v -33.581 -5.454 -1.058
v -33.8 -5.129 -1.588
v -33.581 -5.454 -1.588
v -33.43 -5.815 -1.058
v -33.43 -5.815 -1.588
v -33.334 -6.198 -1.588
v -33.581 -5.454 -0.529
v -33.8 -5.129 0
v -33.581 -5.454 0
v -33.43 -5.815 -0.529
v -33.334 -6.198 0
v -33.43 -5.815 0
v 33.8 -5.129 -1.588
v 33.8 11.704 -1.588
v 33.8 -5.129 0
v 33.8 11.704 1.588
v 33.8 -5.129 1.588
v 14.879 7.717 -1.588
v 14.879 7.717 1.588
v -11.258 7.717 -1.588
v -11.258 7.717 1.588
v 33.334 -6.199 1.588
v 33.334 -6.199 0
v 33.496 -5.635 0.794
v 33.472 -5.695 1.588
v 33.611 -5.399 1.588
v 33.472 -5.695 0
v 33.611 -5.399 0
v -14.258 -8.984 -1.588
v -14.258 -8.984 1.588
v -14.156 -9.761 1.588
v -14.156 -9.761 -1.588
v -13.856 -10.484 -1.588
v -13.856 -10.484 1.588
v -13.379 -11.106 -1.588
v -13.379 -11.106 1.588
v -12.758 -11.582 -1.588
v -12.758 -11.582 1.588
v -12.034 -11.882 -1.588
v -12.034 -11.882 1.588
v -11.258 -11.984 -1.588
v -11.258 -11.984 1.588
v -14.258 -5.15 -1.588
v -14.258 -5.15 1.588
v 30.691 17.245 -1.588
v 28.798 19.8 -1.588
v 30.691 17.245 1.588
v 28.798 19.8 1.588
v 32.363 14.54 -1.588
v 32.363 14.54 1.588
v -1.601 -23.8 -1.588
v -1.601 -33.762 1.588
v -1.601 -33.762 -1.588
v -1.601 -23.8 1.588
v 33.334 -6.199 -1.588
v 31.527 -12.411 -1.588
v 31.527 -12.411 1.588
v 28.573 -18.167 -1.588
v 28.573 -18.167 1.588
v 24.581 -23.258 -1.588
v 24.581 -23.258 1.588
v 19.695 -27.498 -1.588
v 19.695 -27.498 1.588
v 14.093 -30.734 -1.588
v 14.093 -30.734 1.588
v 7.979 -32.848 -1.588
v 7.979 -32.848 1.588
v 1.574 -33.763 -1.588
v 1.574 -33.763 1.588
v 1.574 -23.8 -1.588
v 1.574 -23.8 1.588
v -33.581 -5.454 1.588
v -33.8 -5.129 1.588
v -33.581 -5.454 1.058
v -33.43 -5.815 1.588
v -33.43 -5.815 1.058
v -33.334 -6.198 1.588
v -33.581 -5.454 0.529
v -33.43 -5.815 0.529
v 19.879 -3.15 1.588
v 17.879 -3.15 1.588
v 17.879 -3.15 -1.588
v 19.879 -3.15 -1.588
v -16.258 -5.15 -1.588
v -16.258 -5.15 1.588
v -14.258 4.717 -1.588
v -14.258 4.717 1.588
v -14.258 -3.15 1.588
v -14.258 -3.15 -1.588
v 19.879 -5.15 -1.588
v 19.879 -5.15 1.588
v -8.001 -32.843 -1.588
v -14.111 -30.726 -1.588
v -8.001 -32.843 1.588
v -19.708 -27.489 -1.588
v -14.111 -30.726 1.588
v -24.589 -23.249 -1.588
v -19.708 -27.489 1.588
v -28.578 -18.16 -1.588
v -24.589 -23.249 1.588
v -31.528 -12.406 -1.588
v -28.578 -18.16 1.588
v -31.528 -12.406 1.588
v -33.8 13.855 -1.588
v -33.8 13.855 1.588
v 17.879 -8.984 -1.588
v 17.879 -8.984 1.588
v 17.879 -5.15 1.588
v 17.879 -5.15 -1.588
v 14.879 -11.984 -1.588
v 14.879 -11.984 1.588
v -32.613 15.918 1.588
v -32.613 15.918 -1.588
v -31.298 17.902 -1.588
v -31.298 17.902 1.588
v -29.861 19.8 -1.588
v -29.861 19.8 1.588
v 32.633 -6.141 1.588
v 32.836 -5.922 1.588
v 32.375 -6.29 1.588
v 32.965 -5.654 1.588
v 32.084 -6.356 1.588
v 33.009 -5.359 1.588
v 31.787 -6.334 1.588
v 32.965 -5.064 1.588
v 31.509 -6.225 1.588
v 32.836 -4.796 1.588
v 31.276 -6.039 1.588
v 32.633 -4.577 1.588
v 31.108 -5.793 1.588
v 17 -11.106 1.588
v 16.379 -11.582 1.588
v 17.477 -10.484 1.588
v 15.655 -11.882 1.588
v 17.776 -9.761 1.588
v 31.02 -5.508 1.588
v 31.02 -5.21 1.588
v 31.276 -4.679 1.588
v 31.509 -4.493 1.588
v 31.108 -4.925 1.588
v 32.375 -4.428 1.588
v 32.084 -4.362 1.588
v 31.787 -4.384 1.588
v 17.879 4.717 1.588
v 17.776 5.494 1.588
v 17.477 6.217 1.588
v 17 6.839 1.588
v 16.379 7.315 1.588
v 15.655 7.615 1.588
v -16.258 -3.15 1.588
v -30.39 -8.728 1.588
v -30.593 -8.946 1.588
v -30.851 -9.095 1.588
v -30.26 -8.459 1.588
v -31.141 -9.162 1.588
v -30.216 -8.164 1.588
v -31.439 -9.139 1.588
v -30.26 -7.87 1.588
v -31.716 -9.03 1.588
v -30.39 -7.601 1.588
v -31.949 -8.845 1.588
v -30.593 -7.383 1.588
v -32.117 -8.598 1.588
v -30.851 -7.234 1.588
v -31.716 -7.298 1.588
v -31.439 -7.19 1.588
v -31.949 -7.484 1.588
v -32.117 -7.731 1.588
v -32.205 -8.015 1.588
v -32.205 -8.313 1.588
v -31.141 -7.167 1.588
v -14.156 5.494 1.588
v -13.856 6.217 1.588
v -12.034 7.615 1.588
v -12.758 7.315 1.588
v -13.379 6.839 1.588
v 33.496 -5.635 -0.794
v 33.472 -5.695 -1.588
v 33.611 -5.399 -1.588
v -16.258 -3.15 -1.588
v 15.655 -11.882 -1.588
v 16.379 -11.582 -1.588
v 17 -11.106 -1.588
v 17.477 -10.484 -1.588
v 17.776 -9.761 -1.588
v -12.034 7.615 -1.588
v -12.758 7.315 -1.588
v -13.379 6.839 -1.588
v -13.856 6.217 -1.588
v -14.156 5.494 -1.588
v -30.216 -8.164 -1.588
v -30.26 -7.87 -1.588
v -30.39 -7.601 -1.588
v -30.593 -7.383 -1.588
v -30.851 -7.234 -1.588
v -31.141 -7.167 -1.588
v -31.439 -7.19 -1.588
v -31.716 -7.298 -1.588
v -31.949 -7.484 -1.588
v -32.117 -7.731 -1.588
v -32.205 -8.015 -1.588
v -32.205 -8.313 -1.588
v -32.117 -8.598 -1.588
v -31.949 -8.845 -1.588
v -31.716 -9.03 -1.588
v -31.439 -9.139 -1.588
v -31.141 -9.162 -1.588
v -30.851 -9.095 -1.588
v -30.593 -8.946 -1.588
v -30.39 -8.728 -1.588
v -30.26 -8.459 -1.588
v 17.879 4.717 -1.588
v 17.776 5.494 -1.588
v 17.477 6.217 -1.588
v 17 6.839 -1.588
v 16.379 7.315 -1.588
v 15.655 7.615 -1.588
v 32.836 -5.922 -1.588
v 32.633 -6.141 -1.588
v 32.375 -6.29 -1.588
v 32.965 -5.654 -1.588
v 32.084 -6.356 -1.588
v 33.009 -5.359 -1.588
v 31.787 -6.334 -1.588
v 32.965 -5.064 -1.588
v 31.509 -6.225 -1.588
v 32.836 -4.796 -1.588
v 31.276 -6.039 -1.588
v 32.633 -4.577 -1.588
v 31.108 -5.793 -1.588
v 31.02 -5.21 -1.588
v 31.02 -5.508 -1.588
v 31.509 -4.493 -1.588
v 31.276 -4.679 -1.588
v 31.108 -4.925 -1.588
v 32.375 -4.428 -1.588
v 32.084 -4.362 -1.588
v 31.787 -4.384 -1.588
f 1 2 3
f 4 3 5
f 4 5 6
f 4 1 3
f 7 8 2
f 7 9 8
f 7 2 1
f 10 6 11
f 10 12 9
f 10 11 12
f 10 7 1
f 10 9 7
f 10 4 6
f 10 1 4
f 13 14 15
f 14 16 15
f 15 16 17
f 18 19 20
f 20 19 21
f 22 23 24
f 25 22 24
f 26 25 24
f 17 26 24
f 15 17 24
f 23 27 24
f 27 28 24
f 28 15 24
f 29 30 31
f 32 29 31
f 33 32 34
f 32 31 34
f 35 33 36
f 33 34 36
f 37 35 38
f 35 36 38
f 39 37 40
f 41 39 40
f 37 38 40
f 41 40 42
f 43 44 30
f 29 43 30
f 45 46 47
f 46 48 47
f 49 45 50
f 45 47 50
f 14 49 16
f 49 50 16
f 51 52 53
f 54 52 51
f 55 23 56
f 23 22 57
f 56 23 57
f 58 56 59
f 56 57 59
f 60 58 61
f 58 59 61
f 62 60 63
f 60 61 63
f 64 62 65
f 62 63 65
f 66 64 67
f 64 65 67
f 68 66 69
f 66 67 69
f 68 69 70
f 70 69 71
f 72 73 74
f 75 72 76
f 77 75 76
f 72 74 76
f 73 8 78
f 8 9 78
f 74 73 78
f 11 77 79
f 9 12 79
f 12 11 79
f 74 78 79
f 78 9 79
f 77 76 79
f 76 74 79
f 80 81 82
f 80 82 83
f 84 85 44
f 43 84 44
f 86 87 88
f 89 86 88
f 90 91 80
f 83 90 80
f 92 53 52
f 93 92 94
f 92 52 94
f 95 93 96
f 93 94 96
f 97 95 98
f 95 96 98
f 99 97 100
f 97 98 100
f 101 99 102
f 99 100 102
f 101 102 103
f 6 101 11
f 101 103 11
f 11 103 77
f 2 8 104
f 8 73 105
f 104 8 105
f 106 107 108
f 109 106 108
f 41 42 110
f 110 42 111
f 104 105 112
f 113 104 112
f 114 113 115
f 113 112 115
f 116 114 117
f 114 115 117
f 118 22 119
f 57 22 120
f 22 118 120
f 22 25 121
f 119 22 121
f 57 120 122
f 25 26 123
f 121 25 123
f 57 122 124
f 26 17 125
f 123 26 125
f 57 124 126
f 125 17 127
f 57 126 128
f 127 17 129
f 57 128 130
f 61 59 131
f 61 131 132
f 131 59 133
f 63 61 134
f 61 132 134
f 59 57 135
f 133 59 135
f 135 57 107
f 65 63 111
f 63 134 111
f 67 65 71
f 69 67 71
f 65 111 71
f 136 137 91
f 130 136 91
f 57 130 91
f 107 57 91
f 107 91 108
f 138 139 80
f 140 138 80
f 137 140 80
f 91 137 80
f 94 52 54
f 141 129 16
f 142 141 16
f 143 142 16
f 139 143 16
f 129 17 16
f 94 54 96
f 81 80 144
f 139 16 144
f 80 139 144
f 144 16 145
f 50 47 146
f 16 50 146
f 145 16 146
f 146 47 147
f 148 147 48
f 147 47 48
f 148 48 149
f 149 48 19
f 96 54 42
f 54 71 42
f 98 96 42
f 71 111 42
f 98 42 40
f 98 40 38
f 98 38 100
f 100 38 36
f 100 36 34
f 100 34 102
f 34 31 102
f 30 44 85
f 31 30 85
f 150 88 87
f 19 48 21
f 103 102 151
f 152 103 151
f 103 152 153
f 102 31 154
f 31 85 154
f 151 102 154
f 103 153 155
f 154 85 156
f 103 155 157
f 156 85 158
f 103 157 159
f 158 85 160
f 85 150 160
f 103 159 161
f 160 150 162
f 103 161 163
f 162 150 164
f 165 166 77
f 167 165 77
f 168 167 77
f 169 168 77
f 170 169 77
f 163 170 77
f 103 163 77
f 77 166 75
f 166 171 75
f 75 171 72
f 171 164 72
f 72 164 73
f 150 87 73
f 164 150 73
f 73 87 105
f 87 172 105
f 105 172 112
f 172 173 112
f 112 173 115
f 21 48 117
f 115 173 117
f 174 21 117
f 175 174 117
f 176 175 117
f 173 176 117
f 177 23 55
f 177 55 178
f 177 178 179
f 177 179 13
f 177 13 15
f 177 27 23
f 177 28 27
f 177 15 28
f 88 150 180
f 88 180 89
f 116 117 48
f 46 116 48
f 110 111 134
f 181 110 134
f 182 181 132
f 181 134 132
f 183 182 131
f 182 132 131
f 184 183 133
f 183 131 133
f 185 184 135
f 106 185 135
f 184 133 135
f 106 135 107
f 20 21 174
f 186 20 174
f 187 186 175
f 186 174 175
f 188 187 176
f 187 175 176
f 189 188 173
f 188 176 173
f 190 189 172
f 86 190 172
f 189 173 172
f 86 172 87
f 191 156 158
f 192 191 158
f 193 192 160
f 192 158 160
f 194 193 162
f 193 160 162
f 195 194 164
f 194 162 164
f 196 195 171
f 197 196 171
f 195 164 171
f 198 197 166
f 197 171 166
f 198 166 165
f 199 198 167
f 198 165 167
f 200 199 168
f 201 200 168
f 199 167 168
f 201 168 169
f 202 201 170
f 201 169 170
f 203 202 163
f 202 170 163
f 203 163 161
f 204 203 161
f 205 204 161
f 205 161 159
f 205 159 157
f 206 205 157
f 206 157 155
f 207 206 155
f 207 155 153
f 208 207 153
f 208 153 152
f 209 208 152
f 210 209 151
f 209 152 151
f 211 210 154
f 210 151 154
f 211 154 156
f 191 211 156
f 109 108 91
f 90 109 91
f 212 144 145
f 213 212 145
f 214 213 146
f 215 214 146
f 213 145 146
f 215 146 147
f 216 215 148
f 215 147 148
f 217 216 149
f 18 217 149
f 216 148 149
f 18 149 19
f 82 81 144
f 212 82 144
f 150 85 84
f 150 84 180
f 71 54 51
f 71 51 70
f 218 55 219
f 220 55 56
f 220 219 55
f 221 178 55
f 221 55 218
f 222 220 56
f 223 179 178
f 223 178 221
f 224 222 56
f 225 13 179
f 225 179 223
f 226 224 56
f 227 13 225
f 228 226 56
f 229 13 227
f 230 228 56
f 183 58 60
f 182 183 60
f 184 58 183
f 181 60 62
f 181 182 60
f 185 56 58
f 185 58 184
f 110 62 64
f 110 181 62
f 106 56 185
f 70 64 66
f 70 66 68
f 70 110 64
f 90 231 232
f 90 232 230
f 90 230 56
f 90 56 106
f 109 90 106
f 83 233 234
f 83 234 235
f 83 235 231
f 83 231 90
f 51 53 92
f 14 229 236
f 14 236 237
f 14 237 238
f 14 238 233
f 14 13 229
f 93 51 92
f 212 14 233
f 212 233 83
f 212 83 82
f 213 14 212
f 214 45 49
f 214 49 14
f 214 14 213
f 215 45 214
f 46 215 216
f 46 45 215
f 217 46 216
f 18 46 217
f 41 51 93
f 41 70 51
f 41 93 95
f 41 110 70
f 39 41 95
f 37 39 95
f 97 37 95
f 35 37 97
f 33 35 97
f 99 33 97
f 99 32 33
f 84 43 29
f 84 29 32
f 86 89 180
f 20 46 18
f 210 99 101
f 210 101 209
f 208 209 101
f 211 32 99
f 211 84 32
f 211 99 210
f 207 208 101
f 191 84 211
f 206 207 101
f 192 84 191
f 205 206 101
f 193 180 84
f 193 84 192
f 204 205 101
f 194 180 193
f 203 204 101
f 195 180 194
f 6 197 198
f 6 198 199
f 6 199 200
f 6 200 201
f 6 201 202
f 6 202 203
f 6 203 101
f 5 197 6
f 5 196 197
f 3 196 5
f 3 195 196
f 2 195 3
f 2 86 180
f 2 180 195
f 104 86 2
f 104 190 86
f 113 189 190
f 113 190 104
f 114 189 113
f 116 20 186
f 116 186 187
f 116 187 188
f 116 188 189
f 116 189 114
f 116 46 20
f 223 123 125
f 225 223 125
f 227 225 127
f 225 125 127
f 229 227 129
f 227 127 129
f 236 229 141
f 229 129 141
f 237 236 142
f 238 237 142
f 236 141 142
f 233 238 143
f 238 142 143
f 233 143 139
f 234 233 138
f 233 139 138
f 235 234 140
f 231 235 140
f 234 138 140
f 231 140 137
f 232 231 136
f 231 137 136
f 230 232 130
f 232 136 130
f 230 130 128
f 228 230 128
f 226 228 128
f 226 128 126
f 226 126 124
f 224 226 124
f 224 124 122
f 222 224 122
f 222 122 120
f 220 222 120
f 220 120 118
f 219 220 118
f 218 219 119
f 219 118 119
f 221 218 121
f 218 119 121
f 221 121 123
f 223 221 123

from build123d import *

# Parameters (mm, degrees)
BOSS_EXTRUDE1_DEPTH = 1.5875
SKETCH2_R           = 1
CUT_EXTRUDE1_DEPTH  = 3.175
SKETCH3_W           = 3.175
SKETCH3_H           = 10.970571453
CUT_EXTRUDE2_DEPTH  = 48.905462264
SKETCH4_W           = 2
SKETCH4_H           = 2
CUT_EXTRUDE3_DEPTH  = 48.879683973


with BuildPart() as part:
    # Sketch1 → Boss-Extrude1 (new, symmetric)
    with BuildSketch(Plane.XY):
        with BuildLine():
            Line((-29.861047016, 19.799597713), (28.798323584, 19.799597713))
            ThreePointArc((28.798323584, 19.799597713), (31.555543196, 15.909935232), (33.800017398, 11.703503281))
            Line((33.800017398, 11.703503281), (33.800017398, -5.129281896))
            add(Edge.make_bspline(
                [(33.333736062, -6.198908202), (33.370273649, -6.00495249), (33.420827163, -5.815771167), (33.570327065, -5.45389308), (33.6709127, -5.28028559), (33.800017398, -5.129281896)],
                knots=[0, 0, 0, 0, 0.5, 0.5, 1, 1, 1, 1], degree=3))
            ThreePointArc((33.333736062, -6.198908202), (-0.00068987, -33.79957838), (-33.333992426, -6.197552493))
            add(Edge.make_bspline(
                [(-33.800017403, -5.129281896), (-33.542046516, -5.431010319), (-33.407261527, -5.809359873), (-33.333992426, -6.197552493)],
                knots=[0, 0, 0, 0, 1, 1, 1, 1], degree=3))
            Line((-33.800017403, -5.129281896), (-33.800017403, 13.855371896))
            ThreePointArc((-33.800017403, 13.855371896), (-31.971328776, 16.92078434), (-29.861047016, 19.799597713))
        make_face()
    extrude(amount=BOSS_EXTRUDE1_DEPTH, both=True)

    # Sketch2 → Cut-Extrude1 (cut)
    with BuildSketch(Plane.XY.offset(1.5875)):
        with Locations((-31.216064399, -8.164436653)):
            Circle(SKETCH2_R)
        with Locations((32.009302375, -5.358989516)):
            Circle(SKETCH2_R)
    extrude(amount=-CUT_EXTRUDE1_DEPTH, mode=Mode.SUBTRACT)

    # Sketch3 → Cut-Extrude2 (cut, through all)
    with BuildSketch(Plane.XY.offset(1.5875)):
        with Locations((-0.013127042, -29.284890239)):
            Rectangle(SKETCH3_W, SKETCH3_H)
    extrude(amount=-CUT_EXTRUDE2_DEPTH, mode=Mode.SUBTRACT)

    # Sketch4 → Cut-Extrude3 (cut, through all)
    with BuildSketch(Plane.XY.offset(1.5875)):
        with BuildLine():
            Line((-14.257724699, 4.717183699), (-14.257724699, -8.984256283))
            ThreePointArc((-14.257724699, -8.984256283), (-13.379045042, -11.105576627), (-11.257724699, -11.984256283))
            Line((-11.257724699, -11.984256283), (14.878600613, -11.984256283))
            ThreePointArc((14.878600613, -11.984256283), (16.999920956, -11.105576627), (17.878600613, -8.984256283))
            Line((17.878600613, -8.984256283), (17.878600613, 4.717183699))
            ThreePointArc((17.878600613, 4.717183699), (16.999920956, 6.838504042), (14.878600613, 7.717183699))
            Line((14.878600613, 7.717183699), (-11.257724699, 7.717183699))
            ThreePointArc((-11.257724699, 7.717183699), (-13.379045042, 6.838504042), (-14.257724699, 4.717183699))
        make_face()
        with Locations((-15.257724699, -4.150157902)):
            Rectangle(SKETCH4_W, SKETCH4_H)
        with Locations((18.878600613, -4.150157902)):
            Rectangle(SKETCH4_W, SKETCH4_H)
    extrude(amount=-CUT_EXTRUDE3_DEPTH, mode=Mode.SUBTRACT)


solid = part.part
